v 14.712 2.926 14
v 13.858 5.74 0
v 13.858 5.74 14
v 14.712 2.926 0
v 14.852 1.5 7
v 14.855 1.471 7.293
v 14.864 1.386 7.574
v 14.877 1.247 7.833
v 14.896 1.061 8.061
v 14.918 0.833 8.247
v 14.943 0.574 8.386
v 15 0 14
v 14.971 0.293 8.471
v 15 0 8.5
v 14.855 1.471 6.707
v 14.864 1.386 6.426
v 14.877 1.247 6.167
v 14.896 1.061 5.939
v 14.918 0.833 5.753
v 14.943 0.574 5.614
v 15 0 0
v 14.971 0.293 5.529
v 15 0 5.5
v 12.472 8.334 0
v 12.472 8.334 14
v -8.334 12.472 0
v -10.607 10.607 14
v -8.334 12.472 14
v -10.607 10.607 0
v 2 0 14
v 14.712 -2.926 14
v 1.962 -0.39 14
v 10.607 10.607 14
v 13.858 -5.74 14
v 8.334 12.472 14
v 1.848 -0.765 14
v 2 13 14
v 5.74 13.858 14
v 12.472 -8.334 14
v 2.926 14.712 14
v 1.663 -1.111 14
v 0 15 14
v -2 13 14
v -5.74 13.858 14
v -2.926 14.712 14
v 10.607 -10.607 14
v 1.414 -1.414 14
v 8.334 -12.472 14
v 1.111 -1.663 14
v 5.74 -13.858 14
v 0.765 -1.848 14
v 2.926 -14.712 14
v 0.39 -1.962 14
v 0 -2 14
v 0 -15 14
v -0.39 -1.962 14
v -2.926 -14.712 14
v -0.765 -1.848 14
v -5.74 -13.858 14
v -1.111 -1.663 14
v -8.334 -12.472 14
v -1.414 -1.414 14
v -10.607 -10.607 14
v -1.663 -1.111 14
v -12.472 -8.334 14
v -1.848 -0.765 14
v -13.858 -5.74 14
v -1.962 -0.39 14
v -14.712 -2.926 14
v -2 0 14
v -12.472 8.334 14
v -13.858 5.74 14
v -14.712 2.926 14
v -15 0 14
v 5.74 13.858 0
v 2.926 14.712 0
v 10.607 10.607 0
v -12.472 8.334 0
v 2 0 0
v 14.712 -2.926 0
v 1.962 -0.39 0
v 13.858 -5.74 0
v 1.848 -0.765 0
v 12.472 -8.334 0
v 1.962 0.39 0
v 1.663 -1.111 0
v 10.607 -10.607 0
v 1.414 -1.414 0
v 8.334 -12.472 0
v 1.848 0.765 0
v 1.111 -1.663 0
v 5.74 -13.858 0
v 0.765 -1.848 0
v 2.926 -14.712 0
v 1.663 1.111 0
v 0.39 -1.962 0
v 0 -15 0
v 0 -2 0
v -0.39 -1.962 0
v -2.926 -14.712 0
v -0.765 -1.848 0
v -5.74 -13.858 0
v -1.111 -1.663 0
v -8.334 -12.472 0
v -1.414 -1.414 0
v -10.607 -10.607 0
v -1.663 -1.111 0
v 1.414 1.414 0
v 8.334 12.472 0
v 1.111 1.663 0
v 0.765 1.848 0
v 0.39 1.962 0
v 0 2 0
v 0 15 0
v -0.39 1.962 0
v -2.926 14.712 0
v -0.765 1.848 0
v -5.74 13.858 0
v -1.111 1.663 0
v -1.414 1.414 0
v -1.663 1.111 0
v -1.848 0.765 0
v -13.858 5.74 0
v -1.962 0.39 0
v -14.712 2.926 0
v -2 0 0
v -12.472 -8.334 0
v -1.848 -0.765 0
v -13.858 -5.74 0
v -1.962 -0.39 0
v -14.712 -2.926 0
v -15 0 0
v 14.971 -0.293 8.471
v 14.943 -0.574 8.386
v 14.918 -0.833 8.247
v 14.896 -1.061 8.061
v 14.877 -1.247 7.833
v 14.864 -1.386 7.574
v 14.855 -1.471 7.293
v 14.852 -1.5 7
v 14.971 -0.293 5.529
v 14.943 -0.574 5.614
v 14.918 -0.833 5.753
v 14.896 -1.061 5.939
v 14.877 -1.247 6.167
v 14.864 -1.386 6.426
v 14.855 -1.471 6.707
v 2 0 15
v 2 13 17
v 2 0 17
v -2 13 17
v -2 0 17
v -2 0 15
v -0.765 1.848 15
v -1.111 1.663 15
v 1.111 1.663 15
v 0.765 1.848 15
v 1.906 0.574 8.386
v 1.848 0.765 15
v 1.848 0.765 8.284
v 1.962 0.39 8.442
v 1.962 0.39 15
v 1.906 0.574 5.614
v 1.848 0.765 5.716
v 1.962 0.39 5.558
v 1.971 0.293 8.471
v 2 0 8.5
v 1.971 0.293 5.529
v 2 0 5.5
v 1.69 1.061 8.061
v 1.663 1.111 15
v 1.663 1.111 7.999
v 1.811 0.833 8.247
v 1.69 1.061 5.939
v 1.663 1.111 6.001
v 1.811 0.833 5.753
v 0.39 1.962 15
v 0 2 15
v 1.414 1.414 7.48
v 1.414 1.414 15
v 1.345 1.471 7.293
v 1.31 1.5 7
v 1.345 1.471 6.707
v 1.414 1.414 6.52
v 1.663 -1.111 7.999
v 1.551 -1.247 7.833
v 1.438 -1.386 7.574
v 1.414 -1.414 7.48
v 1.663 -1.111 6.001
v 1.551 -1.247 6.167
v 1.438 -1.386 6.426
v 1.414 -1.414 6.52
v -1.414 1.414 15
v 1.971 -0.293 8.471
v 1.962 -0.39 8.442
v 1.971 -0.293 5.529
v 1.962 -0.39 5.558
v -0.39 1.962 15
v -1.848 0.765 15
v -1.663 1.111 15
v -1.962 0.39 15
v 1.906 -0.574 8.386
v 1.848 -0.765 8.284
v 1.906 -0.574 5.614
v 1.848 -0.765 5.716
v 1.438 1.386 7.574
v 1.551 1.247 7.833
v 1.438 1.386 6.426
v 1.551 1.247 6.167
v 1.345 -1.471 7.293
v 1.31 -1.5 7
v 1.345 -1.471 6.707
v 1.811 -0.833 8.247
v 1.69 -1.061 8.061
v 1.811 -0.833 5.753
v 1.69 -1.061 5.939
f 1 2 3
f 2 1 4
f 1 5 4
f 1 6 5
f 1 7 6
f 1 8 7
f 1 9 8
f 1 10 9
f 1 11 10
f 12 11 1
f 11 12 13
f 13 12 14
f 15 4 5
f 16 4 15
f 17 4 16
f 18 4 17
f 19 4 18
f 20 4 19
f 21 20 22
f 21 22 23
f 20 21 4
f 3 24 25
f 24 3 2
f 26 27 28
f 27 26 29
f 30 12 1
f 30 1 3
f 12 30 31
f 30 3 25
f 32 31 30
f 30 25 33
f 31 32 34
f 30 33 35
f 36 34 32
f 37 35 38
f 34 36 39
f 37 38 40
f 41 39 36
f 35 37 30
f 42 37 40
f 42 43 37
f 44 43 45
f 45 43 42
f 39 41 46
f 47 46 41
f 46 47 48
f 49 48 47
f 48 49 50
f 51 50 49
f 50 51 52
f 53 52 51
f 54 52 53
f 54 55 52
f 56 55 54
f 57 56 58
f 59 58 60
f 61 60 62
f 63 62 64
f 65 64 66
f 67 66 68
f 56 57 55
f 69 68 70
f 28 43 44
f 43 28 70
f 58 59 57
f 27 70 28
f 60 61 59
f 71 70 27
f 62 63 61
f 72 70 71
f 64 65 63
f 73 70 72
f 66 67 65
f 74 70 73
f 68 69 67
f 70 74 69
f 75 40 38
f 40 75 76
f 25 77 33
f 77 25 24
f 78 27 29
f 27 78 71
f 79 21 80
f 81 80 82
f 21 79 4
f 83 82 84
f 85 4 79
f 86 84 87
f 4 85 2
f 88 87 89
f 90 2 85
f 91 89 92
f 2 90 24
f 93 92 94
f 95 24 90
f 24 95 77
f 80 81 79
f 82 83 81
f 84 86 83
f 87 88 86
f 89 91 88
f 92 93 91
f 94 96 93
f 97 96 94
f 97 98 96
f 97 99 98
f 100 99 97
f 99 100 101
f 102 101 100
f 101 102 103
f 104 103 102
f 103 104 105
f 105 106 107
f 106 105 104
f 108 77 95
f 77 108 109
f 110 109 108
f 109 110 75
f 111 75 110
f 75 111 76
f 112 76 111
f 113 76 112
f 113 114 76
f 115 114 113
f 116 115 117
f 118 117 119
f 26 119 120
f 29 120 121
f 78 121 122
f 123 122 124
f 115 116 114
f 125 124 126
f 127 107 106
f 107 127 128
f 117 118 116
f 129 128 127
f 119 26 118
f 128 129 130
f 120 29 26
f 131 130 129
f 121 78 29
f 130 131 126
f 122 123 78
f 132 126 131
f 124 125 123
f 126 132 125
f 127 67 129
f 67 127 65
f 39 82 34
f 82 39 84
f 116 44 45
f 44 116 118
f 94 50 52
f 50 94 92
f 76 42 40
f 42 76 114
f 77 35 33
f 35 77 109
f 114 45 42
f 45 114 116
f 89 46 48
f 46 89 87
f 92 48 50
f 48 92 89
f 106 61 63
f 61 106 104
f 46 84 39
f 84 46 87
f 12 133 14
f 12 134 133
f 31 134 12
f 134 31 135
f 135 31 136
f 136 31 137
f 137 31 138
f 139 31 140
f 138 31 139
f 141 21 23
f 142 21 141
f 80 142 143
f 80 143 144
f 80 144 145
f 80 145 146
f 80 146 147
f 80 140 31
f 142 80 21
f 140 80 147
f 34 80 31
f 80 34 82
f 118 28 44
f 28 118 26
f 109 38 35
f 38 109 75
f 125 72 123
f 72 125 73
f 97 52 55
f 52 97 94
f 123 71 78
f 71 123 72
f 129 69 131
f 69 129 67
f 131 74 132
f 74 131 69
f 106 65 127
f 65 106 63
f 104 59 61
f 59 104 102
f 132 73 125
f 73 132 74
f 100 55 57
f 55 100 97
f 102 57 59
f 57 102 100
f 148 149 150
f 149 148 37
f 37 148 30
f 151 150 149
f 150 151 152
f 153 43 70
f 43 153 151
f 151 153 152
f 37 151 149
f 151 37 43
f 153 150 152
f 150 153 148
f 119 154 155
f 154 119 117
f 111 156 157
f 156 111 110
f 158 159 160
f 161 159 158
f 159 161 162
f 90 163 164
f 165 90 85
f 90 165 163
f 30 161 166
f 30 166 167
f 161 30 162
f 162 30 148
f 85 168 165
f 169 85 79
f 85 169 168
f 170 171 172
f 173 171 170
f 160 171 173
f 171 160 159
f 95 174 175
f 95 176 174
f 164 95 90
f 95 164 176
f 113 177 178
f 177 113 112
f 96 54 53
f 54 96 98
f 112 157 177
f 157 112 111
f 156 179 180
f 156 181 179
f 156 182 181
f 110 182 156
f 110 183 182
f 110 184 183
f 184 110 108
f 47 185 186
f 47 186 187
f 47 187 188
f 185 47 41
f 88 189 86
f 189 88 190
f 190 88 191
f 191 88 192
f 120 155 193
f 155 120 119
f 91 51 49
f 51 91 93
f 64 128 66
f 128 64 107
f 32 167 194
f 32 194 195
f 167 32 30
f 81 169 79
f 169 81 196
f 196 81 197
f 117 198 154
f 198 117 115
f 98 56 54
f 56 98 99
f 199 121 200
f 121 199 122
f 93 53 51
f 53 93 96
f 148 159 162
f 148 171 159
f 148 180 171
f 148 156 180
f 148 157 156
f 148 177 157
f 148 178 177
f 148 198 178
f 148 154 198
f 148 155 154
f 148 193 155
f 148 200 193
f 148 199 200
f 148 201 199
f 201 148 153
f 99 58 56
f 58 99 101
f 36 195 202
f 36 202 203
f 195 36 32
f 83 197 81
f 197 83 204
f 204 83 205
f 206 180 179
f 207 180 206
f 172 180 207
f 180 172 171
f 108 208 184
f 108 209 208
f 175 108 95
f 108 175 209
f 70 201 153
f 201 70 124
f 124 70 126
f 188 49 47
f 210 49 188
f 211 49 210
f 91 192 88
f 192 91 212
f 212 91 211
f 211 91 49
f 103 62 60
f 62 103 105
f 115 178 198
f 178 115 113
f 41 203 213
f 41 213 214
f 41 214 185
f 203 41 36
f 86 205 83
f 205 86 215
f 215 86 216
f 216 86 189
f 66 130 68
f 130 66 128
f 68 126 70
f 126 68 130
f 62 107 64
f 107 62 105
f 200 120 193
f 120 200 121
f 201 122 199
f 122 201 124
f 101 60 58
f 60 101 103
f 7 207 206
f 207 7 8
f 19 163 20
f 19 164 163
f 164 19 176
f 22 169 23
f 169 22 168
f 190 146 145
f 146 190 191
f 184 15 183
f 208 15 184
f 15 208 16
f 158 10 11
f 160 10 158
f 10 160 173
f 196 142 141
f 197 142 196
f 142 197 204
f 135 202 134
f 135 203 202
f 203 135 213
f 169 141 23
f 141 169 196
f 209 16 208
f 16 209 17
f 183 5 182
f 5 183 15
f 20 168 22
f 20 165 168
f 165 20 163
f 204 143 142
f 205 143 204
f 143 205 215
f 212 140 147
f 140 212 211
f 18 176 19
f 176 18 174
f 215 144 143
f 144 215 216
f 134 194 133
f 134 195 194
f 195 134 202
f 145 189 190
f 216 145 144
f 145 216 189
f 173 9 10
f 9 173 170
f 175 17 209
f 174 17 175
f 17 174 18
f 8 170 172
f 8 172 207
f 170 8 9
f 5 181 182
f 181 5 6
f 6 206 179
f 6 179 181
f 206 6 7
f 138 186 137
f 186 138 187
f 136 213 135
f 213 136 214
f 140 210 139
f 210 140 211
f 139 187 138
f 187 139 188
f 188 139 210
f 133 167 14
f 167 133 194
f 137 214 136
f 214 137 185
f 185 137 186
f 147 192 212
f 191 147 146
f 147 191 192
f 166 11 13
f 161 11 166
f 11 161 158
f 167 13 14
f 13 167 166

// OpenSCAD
$fn = 32;

// ----------------------------------------------------------------------
// Control knob: pointer knob
// ----------------------------------------------------------------------

// --- parameters (mm) ---
rib_w = 4;                // pointer rib width
rib_h = 4;                // pointer rib height
knob_d = 30;              // knob body diameter
knob_h = 14;              // knob body height
bore_d = 4;               // shaft bore diameter
set_d = 3;                // set screw bore diameter

rib_poke = rib_h - 1;  // rib height above the top
total_h = knob_h + rib_h - 1;  // overall height

difference() {
  union() {
    cylinder(h = knob_h, d = knob_d);
    translate([-rib_w / 2, 0, knob_h - 1])
      cube([rib_w, knob_d / 2 - 2, rib_h]);
  }
  translate([0, 0, -1]) cylinder(h = knob_h + 2, d = bore_d);
  translate([-1, 0, knob_h / 2]) rotate([0, 90, 0])
    cylinder(h = knob_d / 2 + bore_d / 2 + 2, d = set_d);}
